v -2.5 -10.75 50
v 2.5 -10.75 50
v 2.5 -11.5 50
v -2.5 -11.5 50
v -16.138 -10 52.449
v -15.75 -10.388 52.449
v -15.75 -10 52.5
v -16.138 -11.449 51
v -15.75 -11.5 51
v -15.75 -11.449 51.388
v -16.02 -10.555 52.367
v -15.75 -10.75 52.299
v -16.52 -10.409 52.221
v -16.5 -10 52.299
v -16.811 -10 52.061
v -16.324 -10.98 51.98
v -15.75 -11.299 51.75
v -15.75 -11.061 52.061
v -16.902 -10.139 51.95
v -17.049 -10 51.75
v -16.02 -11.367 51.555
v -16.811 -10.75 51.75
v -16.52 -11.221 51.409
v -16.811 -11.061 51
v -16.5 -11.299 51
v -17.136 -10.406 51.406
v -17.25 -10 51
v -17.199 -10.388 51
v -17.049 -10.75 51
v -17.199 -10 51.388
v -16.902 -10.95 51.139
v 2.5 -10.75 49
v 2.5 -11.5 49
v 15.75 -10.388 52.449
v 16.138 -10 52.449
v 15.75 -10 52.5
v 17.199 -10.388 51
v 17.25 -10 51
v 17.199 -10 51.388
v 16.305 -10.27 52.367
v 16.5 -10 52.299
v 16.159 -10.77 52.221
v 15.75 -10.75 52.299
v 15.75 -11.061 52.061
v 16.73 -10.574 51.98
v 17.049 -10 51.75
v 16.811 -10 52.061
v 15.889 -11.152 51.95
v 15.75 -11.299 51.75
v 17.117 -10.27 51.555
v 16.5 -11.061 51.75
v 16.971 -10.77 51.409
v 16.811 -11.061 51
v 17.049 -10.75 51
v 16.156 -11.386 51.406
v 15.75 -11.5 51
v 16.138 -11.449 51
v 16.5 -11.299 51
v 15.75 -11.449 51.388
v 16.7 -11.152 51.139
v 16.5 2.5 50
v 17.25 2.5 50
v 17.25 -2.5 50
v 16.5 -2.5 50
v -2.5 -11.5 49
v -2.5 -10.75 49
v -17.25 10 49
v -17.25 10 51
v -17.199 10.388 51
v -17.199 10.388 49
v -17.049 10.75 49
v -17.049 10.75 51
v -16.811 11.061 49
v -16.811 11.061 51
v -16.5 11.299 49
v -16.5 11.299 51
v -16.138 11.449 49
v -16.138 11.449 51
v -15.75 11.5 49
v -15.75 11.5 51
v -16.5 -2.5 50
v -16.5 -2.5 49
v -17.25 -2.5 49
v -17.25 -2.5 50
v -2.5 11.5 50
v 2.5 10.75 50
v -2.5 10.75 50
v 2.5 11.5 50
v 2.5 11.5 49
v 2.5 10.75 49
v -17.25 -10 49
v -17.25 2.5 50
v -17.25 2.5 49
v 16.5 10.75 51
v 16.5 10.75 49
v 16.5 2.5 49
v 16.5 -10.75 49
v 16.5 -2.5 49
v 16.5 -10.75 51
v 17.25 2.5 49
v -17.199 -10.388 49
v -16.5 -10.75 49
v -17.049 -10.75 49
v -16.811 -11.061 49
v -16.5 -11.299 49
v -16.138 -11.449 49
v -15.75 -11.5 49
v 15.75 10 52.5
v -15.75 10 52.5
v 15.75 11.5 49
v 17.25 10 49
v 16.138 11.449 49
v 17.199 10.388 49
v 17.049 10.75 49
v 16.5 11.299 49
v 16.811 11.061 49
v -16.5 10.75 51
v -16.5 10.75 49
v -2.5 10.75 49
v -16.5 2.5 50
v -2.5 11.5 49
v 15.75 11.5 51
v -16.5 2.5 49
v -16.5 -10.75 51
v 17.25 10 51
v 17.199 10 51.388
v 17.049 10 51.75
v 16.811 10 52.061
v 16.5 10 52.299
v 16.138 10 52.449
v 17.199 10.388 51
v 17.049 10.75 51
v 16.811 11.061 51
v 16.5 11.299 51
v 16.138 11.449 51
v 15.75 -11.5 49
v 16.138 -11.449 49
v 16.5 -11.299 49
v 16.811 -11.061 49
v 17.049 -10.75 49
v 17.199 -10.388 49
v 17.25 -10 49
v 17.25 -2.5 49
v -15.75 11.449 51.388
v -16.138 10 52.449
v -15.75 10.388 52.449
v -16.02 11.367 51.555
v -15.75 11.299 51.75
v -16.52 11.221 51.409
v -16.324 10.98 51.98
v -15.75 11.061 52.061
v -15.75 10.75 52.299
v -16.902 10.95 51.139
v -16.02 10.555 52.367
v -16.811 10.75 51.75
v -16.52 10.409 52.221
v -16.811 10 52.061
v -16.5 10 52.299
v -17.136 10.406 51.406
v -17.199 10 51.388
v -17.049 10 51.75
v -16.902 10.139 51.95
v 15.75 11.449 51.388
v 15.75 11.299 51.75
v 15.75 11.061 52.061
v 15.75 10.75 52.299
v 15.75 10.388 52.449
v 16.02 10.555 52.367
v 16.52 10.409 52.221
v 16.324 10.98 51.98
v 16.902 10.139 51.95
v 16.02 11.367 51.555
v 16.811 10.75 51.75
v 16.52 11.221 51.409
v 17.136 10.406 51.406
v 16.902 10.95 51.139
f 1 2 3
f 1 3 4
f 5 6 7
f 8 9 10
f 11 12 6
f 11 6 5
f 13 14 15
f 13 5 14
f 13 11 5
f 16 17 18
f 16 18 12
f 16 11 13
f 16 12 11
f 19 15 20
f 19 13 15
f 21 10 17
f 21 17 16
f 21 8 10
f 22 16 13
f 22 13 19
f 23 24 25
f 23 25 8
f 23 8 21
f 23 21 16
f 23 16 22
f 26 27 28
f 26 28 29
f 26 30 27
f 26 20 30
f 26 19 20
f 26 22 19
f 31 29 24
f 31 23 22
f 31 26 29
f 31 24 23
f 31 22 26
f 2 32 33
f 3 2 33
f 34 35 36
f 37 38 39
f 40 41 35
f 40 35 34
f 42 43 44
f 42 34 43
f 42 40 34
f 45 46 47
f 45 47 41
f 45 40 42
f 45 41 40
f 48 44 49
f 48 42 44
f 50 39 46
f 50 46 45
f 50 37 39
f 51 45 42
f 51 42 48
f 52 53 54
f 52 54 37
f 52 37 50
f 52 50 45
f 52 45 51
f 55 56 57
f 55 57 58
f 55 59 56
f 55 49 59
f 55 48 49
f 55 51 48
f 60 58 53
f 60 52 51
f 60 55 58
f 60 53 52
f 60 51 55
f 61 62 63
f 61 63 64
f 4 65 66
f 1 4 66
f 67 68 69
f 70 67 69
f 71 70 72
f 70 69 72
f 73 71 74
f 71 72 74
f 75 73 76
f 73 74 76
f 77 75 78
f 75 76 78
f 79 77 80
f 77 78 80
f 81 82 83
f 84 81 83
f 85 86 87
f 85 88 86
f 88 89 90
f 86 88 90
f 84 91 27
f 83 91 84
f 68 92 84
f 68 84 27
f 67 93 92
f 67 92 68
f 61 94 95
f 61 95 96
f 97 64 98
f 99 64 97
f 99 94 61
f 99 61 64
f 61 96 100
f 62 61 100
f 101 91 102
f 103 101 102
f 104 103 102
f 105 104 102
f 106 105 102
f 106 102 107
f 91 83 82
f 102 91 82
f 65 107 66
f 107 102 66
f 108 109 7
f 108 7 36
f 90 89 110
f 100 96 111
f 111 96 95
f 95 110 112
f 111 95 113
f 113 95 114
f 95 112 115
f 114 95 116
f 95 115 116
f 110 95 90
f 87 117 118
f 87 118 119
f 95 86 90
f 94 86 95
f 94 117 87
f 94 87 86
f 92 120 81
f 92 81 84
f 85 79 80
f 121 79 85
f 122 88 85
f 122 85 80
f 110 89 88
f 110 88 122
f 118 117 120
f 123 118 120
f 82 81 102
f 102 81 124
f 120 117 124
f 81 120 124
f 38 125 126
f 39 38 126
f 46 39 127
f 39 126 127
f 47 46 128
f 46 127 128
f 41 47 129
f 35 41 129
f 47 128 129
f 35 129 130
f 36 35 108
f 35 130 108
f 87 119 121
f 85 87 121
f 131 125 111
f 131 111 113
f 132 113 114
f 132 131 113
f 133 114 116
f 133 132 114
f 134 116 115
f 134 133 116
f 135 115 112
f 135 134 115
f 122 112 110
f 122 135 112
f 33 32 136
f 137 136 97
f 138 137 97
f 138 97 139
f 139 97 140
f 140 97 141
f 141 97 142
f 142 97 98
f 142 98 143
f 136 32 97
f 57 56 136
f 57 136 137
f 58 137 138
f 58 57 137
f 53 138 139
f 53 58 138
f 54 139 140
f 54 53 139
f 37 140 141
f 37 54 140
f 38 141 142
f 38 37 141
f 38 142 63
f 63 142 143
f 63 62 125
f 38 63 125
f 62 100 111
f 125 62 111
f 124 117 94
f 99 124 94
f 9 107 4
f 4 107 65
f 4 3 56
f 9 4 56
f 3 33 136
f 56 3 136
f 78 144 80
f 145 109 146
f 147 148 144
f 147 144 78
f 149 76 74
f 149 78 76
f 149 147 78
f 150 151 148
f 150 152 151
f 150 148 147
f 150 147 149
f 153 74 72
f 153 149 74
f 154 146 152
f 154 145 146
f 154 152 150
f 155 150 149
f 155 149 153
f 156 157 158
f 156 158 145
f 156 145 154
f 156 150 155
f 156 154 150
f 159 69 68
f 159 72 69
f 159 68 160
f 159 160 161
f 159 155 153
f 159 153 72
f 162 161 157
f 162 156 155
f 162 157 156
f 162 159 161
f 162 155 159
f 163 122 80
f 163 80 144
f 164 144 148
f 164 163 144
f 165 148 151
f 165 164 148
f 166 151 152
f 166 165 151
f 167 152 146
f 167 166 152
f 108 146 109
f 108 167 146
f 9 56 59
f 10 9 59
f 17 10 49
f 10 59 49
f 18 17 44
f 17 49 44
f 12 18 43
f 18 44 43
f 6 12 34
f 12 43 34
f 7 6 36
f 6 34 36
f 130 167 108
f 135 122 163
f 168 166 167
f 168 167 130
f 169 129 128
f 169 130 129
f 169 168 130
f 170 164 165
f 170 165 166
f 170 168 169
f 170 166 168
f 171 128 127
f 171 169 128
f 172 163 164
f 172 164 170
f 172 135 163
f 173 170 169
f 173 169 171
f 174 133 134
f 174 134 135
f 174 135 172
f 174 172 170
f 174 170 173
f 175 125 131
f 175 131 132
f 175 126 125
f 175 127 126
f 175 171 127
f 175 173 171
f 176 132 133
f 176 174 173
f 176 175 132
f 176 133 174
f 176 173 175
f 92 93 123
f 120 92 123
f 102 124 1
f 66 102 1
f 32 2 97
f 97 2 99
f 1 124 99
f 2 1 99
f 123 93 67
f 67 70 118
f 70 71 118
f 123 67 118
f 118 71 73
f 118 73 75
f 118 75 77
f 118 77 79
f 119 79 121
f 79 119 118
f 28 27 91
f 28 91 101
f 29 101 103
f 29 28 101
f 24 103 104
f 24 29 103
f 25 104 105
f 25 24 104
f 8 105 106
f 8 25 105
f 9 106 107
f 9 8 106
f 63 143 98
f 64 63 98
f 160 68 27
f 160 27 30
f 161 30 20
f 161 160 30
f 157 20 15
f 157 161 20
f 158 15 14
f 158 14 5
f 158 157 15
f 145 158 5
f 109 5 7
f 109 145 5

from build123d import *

# Parameters (mm, degrees)
SKETCH046_W     = 31.5
SKETCH046_H     = 20
PAD026_DEPTH    = 2
THICKNESS008_T  = 1.5
SKETCH050_W     = 33
SKETCH050_H     = 21.5
POCKET016_DEPTH = 5
POCKET017_DEPTH = 1


with BuildPart() as part:
    # Sketch046 → Pad026 (new body)
    with BuildSketch(Plane.XY):
        Rectangle(SKETCH046_W, SKETCH046_H)
    extrude(amount=PAD026_DEPTH)

    # Thickness008
    thickness008_openings = [part.faces().sort_by_distance(p)[0] for p in [
        (0, 0, 0),
    ]]
    offset(amount=THICKNESS008_T, openings=thickness008_openings)

    # Sketch050 (on Face5 of Thickness008) → Pocket016 (cut)
    with BuildSketch(Plane(origin=(0, 0, 2), x_dir=(1, 0, 0), z_dir=(0, 0, -1))):
        Rectangle(SKETCH050_W, SKETCH050_H)
    extrude(amount=POCKET016_DEPTH, mode=Mode.SUBTRACT)

    # Sketch048 → Pocket017 (cut)
    with BuildSketch(Plane.XY):
        Polygon((-28.138837, 2.5), (-2.5, 2.5), (-2.5, 15.913807), (2.5, 15.913807), (2.5, 2.5), (28.138837, 2.5), (28.138837, -2.5), (2.5, -2.5), (2.5, -15.913807), (-2.5, -15.913807), (-2.5, -2.5), (-28.138837, -2.5), align=None)
    extrude(amount=POCKET017_DEPTH, mode=Mode.SUBTRACT)


with BuildPart() as part_1:
    # Body011 placement: moved
    add(part.part.moved(Location((0, 0, 49))))


solid = part_1.part
